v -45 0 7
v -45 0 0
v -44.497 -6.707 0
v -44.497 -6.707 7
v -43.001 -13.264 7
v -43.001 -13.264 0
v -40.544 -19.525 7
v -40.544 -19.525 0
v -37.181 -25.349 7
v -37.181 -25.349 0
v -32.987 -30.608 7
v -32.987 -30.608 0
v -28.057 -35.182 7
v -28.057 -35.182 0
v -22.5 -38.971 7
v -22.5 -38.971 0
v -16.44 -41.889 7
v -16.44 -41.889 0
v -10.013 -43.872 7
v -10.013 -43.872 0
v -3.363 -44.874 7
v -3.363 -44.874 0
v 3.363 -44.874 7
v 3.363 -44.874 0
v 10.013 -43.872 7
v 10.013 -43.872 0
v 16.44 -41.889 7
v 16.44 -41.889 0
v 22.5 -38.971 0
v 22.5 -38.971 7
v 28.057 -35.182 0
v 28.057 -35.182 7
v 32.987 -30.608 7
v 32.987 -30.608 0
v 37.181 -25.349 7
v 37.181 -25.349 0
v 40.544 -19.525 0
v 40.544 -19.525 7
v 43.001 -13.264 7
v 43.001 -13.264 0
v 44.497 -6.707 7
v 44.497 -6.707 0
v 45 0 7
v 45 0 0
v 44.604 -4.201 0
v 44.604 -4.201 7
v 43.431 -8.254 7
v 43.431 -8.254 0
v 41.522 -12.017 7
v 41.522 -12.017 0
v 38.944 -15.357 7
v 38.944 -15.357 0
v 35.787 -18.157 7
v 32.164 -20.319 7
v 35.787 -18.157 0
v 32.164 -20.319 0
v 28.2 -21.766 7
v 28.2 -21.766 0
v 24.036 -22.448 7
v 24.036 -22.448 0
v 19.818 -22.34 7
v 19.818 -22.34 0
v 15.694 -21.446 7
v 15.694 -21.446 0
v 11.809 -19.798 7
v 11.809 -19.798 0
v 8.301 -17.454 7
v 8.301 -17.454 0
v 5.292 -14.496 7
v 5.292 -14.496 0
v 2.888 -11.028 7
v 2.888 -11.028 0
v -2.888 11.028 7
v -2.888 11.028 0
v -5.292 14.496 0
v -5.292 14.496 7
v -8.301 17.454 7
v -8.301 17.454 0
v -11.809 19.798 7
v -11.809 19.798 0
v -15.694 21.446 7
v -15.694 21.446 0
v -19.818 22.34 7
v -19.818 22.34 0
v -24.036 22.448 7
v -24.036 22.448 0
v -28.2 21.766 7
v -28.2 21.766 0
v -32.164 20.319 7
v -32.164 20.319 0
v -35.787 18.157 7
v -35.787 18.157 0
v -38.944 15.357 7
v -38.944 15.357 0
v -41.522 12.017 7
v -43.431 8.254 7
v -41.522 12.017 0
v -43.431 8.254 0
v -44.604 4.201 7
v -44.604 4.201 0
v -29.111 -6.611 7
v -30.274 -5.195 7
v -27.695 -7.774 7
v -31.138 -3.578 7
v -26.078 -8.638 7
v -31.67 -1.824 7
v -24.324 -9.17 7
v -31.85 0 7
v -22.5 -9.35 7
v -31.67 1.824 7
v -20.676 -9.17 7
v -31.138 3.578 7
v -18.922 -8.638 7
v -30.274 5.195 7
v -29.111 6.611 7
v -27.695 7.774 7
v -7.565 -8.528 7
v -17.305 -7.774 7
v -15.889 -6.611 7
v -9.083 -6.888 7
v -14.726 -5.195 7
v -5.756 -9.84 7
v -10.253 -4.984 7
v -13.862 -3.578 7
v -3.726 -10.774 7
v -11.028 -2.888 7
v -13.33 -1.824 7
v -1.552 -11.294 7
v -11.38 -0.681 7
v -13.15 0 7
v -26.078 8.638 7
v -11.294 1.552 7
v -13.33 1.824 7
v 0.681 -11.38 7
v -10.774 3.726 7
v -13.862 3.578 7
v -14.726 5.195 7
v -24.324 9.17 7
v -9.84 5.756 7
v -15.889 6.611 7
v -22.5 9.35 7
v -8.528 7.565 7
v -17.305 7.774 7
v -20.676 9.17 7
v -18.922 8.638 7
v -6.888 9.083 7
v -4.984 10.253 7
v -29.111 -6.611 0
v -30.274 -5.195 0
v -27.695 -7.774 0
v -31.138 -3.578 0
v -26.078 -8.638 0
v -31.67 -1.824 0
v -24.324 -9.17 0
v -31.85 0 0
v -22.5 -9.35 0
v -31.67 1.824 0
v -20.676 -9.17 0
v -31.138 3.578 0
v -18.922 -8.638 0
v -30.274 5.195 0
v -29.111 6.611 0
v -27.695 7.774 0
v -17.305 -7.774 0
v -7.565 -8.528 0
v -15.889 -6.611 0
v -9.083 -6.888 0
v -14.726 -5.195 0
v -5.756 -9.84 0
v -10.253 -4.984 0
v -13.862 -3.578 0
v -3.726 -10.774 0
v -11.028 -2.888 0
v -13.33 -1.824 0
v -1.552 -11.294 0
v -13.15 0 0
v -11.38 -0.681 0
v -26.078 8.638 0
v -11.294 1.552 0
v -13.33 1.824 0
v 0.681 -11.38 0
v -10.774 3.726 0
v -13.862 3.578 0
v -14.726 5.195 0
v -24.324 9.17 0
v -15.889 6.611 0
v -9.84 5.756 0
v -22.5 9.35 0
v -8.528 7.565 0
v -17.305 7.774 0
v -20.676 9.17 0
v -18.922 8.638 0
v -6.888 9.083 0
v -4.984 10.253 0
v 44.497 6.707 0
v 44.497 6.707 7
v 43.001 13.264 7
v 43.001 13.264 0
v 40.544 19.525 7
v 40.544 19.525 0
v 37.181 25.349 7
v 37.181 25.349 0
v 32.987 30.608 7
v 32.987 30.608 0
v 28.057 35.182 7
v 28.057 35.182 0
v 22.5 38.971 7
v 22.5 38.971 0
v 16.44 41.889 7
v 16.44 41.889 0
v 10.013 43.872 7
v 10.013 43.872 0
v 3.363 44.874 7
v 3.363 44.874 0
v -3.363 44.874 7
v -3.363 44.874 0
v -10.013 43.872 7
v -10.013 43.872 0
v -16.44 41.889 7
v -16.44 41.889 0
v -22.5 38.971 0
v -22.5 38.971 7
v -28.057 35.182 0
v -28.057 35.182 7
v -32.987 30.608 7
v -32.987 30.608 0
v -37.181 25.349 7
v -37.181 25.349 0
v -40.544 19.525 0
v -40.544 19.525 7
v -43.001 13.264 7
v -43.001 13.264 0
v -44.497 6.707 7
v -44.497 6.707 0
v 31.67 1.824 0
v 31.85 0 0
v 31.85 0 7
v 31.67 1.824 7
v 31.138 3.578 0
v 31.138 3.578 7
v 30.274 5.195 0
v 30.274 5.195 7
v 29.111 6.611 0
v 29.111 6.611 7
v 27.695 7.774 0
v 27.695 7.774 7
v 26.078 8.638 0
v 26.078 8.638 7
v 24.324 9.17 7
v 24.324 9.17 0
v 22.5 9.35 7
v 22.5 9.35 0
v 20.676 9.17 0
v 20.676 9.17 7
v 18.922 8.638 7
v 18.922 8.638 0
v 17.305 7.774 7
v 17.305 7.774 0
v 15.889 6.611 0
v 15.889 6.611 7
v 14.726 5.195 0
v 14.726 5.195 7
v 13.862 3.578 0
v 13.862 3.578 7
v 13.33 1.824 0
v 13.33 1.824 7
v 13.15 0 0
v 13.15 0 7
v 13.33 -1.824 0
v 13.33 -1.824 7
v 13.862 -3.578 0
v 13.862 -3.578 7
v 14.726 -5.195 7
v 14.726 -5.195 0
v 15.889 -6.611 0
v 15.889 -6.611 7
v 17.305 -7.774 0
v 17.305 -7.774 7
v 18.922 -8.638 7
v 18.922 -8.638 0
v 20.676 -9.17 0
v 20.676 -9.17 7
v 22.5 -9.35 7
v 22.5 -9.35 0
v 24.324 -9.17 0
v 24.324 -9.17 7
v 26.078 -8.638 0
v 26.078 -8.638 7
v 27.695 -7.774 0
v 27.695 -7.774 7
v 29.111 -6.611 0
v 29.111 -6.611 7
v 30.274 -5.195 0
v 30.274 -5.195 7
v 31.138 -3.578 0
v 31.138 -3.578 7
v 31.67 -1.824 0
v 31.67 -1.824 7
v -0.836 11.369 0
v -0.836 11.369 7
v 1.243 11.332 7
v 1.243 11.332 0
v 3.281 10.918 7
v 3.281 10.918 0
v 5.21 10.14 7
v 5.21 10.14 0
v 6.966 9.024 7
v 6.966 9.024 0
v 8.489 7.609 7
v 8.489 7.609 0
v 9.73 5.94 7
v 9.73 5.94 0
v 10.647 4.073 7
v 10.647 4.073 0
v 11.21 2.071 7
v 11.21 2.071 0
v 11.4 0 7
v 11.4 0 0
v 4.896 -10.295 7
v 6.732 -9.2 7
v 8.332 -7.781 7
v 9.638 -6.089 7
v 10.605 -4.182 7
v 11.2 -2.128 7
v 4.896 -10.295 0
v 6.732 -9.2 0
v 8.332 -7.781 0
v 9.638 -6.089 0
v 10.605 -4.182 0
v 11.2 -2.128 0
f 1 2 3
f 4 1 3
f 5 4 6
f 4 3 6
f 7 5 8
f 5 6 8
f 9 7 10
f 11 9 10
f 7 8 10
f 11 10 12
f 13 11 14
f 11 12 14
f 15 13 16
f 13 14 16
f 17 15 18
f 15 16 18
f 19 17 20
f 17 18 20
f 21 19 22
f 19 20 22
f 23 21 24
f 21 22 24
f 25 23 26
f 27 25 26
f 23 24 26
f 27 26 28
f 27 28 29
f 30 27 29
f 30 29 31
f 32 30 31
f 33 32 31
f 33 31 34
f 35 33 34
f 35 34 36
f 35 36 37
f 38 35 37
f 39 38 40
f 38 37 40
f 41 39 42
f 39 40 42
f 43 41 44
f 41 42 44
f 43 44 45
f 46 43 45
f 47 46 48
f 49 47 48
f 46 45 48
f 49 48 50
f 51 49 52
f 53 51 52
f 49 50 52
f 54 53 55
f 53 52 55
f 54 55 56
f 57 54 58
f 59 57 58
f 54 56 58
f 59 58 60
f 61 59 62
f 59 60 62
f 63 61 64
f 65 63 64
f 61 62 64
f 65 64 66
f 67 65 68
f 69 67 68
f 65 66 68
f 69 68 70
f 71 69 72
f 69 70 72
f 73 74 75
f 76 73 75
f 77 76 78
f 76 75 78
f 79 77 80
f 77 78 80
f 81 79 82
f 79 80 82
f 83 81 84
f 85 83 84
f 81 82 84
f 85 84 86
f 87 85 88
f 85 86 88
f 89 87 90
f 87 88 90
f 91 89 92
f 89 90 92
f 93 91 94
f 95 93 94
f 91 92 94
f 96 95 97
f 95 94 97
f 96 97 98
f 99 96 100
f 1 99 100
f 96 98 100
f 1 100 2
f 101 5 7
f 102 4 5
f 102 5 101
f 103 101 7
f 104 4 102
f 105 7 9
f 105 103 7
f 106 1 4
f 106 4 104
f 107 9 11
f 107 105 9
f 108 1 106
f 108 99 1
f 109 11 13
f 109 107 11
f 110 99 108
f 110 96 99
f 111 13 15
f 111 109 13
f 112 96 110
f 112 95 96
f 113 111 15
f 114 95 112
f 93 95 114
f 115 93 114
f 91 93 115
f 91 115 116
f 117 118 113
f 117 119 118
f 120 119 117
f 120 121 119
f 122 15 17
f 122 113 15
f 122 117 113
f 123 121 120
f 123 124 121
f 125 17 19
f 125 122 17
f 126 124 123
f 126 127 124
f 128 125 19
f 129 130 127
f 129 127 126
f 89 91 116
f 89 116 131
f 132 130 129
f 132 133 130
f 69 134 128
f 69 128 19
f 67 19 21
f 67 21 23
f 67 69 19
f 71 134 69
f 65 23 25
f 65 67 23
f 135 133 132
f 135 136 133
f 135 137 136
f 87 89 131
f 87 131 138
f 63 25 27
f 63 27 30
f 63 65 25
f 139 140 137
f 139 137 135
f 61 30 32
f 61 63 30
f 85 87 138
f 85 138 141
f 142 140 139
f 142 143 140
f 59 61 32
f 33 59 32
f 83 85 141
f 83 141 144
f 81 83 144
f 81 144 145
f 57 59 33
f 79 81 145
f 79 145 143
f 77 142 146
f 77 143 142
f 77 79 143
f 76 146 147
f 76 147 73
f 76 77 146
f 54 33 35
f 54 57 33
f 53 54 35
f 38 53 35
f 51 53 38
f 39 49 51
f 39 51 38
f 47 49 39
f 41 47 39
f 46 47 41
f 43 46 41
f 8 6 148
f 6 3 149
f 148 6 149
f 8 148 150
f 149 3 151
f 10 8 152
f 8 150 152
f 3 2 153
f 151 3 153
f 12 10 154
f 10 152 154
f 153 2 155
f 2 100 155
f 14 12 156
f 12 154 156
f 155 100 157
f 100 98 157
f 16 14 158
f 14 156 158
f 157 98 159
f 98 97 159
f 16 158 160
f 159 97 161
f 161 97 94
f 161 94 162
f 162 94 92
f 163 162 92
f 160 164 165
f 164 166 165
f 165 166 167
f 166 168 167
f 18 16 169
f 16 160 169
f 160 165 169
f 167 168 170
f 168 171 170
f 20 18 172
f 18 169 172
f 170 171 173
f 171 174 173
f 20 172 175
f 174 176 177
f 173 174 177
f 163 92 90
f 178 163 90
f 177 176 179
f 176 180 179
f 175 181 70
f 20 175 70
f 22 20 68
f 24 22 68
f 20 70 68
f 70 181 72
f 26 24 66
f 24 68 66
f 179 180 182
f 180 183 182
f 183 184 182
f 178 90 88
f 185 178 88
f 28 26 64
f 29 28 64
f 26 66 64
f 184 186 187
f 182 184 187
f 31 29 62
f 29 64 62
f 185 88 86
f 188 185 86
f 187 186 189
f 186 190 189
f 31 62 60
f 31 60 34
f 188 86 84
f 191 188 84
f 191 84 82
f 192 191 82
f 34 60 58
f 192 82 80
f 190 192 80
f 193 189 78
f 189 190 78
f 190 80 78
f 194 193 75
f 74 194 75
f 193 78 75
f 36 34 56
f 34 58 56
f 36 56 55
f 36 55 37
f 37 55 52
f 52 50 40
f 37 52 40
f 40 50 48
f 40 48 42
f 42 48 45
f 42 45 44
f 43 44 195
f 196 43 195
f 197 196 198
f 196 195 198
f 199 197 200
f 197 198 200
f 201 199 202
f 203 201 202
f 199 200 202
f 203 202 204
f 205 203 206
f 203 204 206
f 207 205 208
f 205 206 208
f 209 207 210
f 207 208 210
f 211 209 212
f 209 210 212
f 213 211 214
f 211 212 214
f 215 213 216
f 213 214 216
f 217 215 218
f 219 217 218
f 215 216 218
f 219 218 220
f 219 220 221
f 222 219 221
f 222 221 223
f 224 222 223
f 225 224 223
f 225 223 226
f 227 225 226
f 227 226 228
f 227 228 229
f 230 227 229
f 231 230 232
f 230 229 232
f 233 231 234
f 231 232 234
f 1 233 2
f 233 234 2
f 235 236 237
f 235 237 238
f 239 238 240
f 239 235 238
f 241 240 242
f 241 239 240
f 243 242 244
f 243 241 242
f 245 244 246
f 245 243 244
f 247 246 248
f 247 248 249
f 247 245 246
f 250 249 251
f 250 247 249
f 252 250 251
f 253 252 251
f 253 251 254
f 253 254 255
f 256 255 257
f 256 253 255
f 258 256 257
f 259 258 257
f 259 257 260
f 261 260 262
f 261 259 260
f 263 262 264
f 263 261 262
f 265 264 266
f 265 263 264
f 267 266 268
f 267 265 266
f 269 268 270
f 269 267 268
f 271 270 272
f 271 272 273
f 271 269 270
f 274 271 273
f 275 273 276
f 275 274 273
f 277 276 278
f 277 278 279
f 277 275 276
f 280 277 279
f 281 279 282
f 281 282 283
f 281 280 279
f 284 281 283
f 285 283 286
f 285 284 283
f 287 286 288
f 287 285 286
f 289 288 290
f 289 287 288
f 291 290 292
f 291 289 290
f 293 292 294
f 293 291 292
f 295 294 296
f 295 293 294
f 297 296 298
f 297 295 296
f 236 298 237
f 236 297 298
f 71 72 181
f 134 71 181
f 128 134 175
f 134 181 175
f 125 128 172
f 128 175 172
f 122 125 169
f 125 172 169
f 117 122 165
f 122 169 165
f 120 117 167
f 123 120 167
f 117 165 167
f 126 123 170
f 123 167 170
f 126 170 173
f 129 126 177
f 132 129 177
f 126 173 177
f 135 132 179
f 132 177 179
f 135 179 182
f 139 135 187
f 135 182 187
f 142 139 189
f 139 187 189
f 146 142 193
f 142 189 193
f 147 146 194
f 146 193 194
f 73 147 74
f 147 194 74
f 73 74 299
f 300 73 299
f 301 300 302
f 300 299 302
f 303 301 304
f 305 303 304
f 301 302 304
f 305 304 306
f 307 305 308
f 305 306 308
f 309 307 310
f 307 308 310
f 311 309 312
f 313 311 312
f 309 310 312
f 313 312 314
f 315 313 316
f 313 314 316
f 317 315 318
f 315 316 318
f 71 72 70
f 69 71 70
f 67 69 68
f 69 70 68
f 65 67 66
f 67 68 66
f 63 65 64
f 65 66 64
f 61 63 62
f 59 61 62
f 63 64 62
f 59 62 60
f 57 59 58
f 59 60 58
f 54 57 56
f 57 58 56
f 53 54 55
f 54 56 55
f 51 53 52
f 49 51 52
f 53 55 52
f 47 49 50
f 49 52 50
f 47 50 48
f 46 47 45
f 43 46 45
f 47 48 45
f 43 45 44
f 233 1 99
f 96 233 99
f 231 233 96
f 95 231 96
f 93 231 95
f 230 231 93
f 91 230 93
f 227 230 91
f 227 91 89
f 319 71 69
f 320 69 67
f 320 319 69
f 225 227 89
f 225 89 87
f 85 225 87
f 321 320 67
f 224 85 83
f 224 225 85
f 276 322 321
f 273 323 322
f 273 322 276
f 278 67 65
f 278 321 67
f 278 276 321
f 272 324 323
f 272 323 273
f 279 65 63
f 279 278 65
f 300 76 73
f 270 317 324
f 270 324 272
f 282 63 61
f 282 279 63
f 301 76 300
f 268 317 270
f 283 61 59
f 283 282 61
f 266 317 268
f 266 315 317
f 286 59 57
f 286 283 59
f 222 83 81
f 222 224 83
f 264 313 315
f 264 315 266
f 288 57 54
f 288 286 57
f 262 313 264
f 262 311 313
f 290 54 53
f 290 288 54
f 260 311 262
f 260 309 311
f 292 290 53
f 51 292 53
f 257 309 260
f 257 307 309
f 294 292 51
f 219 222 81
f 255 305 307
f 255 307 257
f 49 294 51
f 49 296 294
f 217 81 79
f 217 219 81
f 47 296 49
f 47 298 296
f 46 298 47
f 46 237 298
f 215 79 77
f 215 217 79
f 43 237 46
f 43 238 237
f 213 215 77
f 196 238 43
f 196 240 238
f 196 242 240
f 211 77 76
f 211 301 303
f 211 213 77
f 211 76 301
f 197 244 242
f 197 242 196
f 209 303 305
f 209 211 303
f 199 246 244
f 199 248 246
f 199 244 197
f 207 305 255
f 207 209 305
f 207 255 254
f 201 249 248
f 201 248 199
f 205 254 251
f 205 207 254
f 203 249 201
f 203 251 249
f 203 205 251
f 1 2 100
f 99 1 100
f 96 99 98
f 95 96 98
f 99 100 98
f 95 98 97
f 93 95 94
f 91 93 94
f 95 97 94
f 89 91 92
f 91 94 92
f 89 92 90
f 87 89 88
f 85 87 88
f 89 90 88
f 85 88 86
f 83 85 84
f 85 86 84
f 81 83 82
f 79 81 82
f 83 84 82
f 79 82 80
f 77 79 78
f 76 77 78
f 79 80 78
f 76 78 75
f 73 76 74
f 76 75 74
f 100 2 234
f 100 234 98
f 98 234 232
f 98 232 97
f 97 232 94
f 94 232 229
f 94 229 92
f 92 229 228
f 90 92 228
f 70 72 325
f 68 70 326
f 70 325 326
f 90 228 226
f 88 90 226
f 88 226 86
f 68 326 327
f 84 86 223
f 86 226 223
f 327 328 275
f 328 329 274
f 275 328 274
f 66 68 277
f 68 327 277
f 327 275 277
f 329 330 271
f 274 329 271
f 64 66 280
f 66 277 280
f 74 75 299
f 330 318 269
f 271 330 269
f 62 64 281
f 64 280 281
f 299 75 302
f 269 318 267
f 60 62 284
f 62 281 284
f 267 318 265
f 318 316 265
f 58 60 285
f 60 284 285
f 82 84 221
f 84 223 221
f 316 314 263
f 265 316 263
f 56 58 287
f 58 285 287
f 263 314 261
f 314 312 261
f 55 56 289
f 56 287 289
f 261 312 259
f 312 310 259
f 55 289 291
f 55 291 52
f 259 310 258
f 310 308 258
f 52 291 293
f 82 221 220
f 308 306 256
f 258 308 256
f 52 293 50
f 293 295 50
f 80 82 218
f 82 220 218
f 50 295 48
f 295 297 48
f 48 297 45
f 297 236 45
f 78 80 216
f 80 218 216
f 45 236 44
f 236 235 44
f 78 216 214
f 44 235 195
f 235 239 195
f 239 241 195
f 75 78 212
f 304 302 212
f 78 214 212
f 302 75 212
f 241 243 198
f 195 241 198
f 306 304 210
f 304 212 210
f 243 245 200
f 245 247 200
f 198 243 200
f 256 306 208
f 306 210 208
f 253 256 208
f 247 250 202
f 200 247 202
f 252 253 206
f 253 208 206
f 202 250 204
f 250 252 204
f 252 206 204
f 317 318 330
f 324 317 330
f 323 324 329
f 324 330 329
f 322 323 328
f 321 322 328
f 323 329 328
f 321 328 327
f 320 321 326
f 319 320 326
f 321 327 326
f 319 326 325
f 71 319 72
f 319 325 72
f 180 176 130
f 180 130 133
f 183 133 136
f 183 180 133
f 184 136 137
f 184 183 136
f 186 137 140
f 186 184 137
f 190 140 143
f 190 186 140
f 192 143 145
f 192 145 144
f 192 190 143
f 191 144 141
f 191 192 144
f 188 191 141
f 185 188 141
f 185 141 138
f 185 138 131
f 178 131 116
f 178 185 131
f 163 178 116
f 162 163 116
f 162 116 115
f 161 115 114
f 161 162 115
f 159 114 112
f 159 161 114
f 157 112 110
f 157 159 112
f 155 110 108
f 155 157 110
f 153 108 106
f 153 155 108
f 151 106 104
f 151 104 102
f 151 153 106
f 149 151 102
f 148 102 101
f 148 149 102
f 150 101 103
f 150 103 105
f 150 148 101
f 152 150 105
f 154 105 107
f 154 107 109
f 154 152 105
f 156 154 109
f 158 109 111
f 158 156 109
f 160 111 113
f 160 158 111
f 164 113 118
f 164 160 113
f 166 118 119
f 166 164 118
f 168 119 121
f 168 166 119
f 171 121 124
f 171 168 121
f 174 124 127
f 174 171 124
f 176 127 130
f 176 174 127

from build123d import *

# Parameters (mm, degrees)
F0_R     = 9.35
F1_DEPTH = 7
F2_DEPTH = 7


with BuildPart() as f1:
    # F0 (on Top) → F1 (new body)
    with BuildSketch(Plane.XY):
        with BuildLine():
            ThreePointArc((-45, 0), (0, -45), (45, 0))
            ThreePointArc((45, 0), (28.2, -21.766029), (2.888, -11.028121))
            ThreePointArc((2.888, -11.028121), (-11.028121, -2.888), (-2.888, 11.028121))
            ThreePointArc((-2.888, 11.028121), (-28.2, 21.766029), (-45, 0))
        make_face()
        with Locations((-22.5, 0)):
            Circle(F0_R, mode=Mode.SUBTRACT)
    extrude(amount=F1_DEPTH)


with BuildPart() as f2:
    # F0 (on Top) → F2 (new body)
    with BuildSketch(Plane.XY):
        with BuildLine():
            ThreePointArc((2.888, -11.028121), (28.2, -21.766029), (45, 0))
            ThreePointArc((45, 0), (0, 45), (-45, 0))
            ThreePointArc((-45, 0), (-28.2, 21.766029), (-2.888, 11.028121))
            ThreePointArc((-2.888, 11.028121), (6.965515, 9.0245), (11.4, 0))
            ThreePointArc((11.4, 0), (9.0245, -6.965515), (2.888, -11.028121))
        make_face()
        with Locations((22.5, 0)):
            Circle(F0_R, mode=Mode.SUBTRACT)
    extrude(amount=F2_DEPTH)


solid = Compound([f1.part, f2.part])
